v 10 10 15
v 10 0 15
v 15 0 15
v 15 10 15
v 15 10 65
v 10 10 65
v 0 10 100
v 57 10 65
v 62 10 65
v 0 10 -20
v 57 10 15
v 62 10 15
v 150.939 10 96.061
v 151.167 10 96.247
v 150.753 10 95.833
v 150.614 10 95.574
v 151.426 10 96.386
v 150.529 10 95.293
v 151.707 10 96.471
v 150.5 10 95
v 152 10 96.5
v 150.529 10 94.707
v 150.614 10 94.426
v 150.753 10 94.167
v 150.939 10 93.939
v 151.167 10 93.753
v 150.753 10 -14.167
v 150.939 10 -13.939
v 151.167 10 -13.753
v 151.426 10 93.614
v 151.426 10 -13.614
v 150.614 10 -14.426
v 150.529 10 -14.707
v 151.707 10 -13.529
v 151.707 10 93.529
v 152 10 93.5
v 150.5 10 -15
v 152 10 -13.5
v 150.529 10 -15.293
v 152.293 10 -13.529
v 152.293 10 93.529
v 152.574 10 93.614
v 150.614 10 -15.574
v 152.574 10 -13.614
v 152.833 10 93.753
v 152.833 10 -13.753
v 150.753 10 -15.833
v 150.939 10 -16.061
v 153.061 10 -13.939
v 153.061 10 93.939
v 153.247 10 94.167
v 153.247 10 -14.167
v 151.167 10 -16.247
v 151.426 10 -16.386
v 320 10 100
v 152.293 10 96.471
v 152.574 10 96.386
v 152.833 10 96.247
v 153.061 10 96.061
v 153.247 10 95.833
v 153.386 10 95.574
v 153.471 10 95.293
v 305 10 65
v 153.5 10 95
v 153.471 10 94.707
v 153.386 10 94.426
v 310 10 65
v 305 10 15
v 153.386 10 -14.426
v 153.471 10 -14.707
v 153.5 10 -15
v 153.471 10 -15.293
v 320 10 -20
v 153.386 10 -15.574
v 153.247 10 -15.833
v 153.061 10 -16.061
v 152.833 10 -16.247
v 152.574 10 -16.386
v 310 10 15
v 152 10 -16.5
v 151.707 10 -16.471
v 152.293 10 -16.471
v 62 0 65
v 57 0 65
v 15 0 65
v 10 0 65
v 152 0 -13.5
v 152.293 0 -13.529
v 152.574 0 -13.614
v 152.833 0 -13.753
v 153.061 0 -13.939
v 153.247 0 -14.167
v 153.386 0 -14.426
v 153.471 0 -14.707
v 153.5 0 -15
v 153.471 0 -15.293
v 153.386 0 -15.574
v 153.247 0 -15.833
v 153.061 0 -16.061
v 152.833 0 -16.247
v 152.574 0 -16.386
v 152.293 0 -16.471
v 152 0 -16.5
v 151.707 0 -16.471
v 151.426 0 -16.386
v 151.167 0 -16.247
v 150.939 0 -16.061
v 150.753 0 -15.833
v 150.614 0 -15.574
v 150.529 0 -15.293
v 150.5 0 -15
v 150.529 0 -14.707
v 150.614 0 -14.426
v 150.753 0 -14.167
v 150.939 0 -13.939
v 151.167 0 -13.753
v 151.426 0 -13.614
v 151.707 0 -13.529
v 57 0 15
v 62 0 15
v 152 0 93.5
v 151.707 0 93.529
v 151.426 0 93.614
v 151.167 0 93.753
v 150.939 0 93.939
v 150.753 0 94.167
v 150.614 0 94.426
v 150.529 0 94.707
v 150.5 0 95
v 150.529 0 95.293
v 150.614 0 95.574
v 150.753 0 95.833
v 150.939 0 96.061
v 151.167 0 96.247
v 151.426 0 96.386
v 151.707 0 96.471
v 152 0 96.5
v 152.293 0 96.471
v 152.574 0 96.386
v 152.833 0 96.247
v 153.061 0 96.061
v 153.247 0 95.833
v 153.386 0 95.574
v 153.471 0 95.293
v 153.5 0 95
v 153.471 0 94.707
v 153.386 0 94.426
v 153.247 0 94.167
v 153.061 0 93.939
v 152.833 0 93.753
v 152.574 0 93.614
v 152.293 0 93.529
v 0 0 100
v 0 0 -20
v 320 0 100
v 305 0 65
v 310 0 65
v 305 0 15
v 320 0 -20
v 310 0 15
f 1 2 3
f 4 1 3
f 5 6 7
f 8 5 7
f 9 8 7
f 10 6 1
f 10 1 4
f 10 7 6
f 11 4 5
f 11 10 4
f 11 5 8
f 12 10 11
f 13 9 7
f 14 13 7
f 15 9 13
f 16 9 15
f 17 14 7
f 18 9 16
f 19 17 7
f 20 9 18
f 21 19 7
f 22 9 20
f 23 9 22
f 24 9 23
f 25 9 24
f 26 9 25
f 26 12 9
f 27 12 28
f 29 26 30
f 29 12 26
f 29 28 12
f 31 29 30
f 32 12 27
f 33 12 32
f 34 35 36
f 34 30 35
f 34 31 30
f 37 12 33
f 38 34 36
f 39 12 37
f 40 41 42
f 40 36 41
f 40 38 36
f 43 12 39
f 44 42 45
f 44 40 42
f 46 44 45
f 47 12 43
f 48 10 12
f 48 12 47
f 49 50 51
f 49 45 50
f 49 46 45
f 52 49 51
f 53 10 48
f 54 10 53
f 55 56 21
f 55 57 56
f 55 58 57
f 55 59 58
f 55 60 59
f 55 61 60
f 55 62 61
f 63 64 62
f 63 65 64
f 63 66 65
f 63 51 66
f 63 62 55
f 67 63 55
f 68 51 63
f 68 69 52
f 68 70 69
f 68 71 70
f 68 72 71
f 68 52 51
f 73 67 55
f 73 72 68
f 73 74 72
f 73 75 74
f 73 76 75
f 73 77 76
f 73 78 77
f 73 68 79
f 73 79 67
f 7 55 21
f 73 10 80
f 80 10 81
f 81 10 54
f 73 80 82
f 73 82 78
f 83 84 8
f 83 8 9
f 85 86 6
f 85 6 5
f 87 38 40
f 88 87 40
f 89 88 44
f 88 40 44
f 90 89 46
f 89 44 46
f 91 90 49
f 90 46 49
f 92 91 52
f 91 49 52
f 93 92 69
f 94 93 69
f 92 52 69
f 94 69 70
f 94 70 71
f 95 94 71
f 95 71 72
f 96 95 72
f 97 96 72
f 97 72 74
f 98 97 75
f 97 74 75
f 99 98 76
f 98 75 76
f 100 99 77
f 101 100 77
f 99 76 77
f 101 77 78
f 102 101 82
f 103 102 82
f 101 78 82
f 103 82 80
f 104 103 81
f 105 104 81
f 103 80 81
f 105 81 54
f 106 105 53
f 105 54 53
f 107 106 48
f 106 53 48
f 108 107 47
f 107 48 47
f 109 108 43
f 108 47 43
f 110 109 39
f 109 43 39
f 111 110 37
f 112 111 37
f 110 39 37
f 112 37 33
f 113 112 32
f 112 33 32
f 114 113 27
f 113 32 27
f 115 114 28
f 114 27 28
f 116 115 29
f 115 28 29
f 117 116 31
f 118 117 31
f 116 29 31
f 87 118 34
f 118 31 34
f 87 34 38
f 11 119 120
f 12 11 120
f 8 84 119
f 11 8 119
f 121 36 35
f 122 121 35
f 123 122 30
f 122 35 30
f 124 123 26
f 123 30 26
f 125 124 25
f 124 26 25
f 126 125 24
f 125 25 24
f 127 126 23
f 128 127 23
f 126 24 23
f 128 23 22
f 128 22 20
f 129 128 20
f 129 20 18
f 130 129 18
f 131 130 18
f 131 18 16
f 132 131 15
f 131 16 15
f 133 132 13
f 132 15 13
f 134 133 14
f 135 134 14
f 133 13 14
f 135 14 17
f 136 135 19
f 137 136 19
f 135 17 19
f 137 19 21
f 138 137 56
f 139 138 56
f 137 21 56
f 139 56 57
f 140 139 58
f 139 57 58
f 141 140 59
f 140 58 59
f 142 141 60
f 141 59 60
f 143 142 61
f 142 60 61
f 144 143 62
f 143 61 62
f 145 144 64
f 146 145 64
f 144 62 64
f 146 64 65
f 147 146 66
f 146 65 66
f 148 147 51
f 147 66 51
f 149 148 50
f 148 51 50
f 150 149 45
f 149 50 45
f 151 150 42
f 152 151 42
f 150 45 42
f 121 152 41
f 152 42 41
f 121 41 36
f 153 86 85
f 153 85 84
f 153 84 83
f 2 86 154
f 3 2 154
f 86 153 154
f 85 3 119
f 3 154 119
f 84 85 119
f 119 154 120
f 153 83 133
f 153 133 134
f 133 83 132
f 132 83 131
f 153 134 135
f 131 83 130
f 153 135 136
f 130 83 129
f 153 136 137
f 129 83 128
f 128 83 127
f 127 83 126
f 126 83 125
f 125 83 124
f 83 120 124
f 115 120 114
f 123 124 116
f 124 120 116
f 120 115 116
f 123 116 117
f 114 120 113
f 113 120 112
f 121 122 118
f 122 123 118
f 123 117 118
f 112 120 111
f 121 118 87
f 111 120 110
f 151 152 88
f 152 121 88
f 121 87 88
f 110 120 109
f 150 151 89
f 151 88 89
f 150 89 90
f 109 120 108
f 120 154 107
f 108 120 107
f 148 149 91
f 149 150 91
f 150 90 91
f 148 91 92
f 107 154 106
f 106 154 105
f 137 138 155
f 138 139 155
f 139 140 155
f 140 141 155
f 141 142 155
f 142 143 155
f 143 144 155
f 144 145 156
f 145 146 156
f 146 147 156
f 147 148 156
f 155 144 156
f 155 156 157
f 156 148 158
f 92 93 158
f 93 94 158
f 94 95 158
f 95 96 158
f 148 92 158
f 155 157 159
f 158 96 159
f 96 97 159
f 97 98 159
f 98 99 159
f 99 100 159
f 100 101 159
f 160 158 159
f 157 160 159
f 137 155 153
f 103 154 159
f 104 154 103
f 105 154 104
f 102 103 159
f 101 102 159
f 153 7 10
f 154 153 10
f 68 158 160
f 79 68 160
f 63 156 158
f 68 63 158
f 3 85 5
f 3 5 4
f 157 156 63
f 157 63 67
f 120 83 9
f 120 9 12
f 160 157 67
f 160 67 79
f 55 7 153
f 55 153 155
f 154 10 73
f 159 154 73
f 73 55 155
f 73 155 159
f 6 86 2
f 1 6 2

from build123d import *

# Parameters (mm, degrees)
SKETCH1_W           = 320
SKETCH1_H           = 80
SKETCH1_W_2         = 5
SKETCH1_H_2         = 50
BOSS_EXTRUDE1_DEPTH = 10
SKETCH2_W           = 320
SKETCH2_H           = 20
BOSS_EXTRUDE2_DEPTH = 10
SKETCH3_R           = 1.5
CUT_EXTRUDE1_DEPTH  = 10


with BuildPart() as part:
    # Sketch1 → Boss-Extrude1 (new body)
    with BuildSketch(Plane(origin=(0, 0, 0), x_dir=(1, 0, 0), z_dir=(0, 1, 0))):
        with Locations((160, -40)):
            Rectangle(SKETCH1_W, SKETCH1_H)
        with Locations((12.5, -40)):
            Rectangle(SKETCH1_W_2, SKETCH1_H_2, mode=Mode.SUBTRACT)
        with Locations((59.5, -40)):
            Rectangle(SKETCH1_W_2, SKETCH1_H_2, mode=Mode.SUBTRACT)
        with Locations((307.5, -40)):
            Rectangle(SKETCH1_W_2, SKETCH1_H_2, mode=Mode.SUBTRACT)
    extrude(amount=BOSS_EXTRUDE1_DEPTH)

    # Sketch2 → Boss-Extrude2 (add)
    with BuildSketch(Plane(origin=(0, 10, 0), x_dir=(1, 0, 0), z_dir=(0, 1, 0))):
        with Locations((160, 10)):
            Rectangle(SKETCH2_W, SKETCH2_H)
        with Locations((160, -90)):
            Rectangle(SKETCH2_W, SKETCH2_H)
    extrude(amount=-BOSS_EXTRUDE2_DEPTH)

    # Sketch3 → Cut-Extrude1 (cut)
    with BuildSketch(Plane(origin=(0, 10, 0), x_dir=(1, 0, 0), z_dir=(0, 1, 0))):
        with Locations(Location((152, 15, 0), (0, 0, 270))):
            Circle(SKETCH3_R)
        with Locations(Location((152, -95, 0), (0, 0, 90))):
            Circle(SKETCH3_R)
    extrude(amount=-CUT_EXTRUDE1_DEPTH, mode=Mode.SUBTRACT)


solid = part.part
